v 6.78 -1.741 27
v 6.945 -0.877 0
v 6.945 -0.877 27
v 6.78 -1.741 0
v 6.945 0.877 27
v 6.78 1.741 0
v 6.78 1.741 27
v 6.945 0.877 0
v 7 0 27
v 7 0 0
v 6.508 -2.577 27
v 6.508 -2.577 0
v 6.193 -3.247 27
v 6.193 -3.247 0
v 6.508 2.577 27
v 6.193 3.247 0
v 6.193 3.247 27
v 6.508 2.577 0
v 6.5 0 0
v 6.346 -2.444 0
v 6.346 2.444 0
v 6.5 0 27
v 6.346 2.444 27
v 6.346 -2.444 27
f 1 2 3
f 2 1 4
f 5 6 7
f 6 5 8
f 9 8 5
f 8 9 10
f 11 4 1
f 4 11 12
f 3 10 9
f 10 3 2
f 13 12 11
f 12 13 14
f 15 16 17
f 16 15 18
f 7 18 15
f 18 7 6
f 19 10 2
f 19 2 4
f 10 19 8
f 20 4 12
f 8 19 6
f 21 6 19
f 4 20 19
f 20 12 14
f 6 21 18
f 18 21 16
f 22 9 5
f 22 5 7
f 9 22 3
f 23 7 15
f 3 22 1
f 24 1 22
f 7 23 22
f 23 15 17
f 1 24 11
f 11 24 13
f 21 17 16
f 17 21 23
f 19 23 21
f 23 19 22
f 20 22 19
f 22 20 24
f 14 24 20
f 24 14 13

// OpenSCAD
$fn = 50;


difference() {
	union() {
		cylinder(h = 27, r = 7.0000000000);
		translate(v = [-16.0000000000, 0, 0]) {
			cylinder(h = 27, r = 7.0000000000);
		}
	}
	union() {
		cylinder(h = 27, r = 3.2500000000);
		cylinder(h = 27, r = 1.8000000000);
		cylinder(h = 27, r = 1.8000000000);
		cylinder(h = 27, r = 1.8000000000);
		translate(v = [-20.5000000000, 0, 0]) {
			hull() {
				translate(v = [-3.7500000000, 0.0000000000, 0]) {
					cylinder(h = 27, r = 10.5000000000);
				}
				translate(v = [3.7500000000, 0.0000000000, 0]) {
					cylinder(h = 27, r = 10.5000000000);
				}
				translate(v = [-3.7500000000, -0.0000000000, 0]) {
					cylinder(h = 27, r = 10.5000000000);
				}
				translate(v = [3.7500000000, -0.0000000000, 0]) {
					cylinder(h = 27, r = 10.5000000000);
				}
			}
		}
		translate(v = [-13.0000000000, 0, 0.0000000000]) {
			cylinder(h = 27, r = 19.5000000000);
		}
	}
}
